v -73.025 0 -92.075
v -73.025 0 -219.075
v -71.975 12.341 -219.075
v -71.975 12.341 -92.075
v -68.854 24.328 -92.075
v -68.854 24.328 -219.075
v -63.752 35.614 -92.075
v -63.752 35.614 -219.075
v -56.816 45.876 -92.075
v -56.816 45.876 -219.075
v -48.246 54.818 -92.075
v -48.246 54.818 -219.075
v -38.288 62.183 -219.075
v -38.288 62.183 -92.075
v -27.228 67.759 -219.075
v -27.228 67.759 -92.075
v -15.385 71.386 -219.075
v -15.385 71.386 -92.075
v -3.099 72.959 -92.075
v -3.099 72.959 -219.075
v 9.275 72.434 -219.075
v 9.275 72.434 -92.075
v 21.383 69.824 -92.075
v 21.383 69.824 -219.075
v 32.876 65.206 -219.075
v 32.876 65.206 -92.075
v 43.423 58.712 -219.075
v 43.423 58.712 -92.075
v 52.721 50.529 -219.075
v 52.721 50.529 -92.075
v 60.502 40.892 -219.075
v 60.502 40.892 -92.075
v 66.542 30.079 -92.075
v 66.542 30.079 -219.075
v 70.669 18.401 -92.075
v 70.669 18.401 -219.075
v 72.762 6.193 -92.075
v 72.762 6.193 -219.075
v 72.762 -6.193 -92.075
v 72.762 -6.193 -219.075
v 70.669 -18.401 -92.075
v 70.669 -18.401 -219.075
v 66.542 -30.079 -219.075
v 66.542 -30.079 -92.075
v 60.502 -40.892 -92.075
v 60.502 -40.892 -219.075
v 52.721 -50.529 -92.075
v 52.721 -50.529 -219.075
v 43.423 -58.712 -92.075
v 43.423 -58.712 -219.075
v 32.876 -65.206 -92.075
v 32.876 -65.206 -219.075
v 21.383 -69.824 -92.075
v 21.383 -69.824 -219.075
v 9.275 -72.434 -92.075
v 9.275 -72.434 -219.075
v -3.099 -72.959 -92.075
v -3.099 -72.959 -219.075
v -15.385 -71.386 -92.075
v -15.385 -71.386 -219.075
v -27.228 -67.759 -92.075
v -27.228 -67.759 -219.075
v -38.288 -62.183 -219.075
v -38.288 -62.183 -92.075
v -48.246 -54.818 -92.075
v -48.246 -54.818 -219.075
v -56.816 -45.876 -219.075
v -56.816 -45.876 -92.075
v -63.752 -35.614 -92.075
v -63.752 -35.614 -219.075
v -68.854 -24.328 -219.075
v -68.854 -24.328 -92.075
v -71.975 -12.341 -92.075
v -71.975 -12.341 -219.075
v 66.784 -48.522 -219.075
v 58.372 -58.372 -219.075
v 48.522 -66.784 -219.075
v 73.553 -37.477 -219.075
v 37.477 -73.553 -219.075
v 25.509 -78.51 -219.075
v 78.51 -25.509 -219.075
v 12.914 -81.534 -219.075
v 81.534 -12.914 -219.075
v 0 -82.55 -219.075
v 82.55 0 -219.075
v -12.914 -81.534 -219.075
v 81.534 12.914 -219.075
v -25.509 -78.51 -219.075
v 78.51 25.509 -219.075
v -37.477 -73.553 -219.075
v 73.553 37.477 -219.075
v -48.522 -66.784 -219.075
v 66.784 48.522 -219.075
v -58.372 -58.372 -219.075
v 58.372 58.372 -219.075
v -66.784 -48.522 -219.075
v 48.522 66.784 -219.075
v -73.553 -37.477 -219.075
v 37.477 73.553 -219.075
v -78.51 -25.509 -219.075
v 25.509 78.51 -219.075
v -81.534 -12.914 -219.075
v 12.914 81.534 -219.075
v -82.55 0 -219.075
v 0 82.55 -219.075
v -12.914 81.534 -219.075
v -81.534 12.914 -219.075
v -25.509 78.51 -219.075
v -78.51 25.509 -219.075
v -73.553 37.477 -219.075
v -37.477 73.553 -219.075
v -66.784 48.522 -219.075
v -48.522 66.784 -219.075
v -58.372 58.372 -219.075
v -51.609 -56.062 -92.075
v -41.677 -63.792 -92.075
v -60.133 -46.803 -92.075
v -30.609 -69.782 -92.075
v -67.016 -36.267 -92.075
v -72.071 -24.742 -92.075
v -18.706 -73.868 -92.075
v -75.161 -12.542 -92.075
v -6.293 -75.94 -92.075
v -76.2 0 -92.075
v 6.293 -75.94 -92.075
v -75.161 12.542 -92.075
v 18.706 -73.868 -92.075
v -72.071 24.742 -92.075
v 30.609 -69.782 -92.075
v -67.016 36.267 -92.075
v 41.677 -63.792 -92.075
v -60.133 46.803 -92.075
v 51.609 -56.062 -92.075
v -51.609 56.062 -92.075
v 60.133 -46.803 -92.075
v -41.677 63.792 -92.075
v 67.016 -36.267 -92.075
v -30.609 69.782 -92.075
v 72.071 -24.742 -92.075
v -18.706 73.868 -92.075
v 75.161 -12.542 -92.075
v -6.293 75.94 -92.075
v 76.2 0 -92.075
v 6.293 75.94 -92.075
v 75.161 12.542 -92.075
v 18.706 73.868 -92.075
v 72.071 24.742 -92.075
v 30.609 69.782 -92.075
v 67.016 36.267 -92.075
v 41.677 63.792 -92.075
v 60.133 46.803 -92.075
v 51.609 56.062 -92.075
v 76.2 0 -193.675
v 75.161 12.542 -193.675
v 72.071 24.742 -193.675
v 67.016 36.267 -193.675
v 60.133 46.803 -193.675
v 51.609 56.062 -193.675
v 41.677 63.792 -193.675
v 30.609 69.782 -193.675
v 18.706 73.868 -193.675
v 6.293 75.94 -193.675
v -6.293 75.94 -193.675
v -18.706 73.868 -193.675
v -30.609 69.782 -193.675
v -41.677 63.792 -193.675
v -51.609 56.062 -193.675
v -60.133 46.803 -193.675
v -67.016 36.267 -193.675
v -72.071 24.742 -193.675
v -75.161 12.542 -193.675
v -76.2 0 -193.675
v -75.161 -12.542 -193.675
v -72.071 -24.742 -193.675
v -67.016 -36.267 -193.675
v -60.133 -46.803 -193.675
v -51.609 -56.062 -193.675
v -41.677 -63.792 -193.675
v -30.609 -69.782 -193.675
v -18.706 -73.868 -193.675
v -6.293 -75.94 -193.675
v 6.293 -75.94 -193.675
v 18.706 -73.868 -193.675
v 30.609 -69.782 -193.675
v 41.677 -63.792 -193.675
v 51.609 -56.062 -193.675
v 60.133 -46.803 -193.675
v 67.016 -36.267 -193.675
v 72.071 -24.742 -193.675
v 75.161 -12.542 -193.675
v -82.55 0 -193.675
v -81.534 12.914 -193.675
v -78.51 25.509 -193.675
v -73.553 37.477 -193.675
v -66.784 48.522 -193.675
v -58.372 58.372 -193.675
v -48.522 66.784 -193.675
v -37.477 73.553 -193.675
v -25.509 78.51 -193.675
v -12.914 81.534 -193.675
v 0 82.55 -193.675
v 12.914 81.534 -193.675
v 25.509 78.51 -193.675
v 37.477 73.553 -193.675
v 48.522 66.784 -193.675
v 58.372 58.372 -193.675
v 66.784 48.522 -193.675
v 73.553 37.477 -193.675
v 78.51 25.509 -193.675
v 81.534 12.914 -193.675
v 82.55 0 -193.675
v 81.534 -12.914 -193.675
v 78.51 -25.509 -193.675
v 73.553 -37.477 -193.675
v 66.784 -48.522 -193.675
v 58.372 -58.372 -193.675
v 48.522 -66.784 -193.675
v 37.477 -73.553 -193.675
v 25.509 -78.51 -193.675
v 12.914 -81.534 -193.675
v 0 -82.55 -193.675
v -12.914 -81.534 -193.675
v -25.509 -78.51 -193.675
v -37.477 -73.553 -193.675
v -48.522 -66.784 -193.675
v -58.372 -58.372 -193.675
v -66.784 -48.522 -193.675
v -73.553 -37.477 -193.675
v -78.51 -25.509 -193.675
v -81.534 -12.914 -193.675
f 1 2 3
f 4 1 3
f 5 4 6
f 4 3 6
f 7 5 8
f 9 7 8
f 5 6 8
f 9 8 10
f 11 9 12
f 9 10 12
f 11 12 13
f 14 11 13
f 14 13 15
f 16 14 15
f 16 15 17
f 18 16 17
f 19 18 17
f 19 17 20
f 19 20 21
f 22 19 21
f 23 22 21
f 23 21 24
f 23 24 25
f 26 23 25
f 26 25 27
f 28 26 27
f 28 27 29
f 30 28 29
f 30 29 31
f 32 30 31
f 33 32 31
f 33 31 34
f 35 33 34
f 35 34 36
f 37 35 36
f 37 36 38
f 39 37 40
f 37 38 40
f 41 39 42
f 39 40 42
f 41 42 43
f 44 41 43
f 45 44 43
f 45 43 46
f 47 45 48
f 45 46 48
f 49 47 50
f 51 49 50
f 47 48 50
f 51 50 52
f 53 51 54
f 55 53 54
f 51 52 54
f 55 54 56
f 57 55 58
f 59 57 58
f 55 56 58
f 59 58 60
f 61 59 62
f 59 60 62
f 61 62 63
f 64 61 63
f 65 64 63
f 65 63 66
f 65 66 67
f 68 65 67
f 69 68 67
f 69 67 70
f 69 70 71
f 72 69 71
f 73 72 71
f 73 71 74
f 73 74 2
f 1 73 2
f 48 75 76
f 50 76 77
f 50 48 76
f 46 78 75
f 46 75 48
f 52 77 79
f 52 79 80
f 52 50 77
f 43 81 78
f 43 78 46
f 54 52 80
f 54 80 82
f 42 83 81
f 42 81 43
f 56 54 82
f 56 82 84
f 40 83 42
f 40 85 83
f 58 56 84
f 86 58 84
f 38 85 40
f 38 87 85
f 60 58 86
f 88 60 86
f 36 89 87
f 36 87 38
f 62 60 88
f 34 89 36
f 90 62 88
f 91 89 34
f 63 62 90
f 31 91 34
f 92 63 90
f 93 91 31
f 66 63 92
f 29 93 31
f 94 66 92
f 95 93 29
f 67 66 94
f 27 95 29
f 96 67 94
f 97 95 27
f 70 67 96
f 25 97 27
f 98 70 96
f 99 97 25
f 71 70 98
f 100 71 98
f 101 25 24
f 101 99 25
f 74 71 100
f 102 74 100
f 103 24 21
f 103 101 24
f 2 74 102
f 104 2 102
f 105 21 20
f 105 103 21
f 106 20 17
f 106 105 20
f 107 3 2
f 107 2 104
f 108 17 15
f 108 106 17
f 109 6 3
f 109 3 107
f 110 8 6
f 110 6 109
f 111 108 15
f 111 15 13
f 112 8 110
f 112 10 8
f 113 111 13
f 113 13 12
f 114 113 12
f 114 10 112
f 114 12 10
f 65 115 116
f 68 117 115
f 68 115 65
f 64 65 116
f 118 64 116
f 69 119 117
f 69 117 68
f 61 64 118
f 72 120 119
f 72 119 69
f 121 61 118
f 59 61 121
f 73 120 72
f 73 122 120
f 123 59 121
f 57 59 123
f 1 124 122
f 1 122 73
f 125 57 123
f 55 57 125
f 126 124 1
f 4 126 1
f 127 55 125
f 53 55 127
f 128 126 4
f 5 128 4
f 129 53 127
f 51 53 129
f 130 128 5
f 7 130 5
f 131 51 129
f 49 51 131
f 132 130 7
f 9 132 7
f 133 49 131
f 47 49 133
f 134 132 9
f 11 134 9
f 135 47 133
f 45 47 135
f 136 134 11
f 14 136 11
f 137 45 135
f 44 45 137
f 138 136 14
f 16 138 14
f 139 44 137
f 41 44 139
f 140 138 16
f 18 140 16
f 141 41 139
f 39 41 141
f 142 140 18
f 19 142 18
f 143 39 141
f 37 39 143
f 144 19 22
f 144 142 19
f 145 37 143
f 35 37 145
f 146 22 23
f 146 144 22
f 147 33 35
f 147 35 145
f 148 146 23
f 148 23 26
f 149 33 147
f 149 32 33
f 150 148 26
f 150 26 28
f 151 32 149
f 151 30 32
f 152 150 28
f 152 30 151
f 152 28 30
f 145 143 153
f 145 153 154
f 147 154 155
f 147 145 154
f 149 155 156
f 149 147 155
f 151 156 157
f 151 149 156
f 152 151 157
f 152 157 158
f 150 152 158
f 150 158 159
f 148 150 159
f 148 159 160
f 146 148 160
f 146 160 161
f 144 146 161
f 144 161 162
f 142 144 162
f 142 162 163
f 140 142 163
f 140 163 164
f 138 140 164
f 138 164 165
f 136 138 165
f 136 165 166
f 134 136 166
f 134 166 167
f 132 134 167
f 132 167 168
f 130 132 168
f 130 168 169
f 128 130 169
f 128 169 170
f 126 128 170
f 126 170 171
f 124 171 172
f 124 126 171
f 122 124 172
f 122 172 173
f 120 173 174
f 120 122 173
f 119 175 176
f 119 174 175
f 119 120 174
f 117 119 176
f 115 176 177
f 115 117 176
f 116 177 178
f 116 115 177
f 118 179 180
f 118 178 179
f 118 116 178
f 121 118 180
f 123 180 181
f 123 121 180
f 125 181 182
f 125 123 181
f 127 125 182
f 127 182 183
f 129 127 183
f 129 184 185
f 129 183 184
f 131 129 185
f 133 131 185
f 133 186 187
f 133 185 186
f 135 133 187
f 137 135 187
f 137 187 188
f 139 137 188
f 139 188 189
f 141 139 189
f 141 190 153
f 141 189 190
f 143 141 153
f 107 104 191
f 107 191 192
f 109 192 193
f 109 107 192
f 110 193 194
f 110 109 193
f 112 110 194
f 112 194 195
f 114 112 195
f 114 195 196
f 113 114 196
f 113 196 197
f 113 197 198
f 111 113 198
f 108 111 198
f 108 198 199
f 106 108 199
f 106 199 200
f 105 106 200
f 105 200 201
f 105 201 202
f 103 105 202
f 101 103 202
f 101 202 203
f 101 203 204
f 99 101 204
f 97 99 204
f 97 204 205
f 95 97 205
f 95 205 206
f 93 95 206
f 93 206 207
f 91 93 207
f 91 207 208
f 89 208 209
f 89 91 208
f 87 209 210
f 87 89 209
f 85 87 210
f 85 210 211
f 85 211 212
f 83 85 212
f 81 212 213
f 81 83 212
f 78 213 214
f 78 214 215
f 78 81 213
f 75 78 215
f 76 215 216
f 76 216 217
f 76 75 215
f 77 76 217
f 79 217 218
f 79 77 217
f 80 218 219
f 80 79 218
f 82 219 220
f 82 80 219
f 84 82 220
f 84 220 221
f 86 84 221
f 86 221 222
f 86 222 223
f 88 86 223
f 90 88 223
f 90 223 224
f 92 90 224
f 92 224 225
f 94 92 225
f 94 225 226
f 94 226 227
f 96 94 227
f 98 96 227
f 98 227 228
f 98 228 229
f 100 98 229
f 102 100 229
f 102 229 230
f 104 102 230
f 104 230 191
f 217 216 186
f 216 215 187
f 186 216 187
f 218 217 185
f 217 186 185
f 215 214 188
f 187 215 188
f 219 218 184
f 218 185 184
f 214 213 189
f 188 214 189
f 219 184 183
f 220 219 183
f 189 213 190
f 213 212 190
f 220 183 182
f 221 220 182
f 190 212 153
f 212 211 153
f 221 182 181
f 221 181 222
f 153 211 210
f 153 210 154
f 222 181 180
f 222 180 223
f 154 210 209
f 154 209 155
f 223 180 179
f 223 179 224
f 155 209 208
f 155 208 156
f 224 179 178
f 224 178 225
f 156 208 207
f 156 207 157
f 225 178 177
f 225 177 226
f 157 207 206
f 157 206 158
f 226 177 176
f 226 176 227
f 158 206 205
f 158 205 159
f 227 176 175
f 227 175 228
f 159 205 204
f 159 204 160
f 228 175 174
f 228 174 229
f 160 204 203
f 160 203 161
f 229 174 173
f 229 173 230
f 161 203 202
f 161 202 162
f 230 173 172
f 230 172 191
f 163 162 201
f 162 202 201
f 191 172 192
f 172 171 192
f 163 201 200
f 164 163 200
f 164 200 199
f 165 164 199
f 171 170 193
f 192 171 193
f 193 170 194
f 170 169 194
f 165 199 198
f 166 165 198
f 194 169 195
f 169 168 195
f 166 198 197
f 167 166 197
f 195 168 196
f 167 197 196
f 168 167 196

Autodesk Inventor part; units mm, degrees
ref_plane "YZ Plane" through (0, 0, 0) normal (1, 0, 0) x (0, 1, 0)
ref_plane "XZ Plane" through (0, 0, 0) normal (0, 1, 0) x (-1, 0, 0)
ref_plane "XY Plane" through (0, 0, 0) normal (0, 0, 1) x (1, 0, 0)
sketch "Sketch1" plane through (0, 0, 0) normal (0, 0, 1) x (1, 0, 0)
  circle A0 centre (0, 0) radius 76.2
  dimension "tubeDiameter" = 152.4
extrude "Extrusion1" add sketch "Sketch1" along normal mid plane 438.15
sketch "Sketch2" plane through (0, 0, -219.075) normal (0, 0, -1) x (-1, 0, 0)
  circle A0 centre (0, 0) radius 73.025
  dimension "d6" = 146.05
extrude "Extrusion2" cut sketch "Sketch2" against normal blind 406.4
sketch "Sketch3" plane through (0, 0, 219.075) normal (0, 0, 1) x (1, 0, 0)
  circle A0 centre (0, 0) radius 82.55
  circle A1 centre (0, 0) radius 76.2
  dimension "d9" = 165.1
extrude "Extrusion3" add sketch "Sketch3" against normal blind 25.4
sketch "Sketch4" plane through (0, 0, -219.075) normal (0, 0, -1) x (-1, 0, 0)
  circle A0 centre (0, 0) radius 76.2
  circle A1 centre (0, 0) radius 82.55
extrude "Extrusion4" add sketch "Sketch4" against normal blind 25.4
sketch "Sketch7" plane through (0, 0, 219.075) normal (0, 0, 1) x (1, 0, 0)
  circle A0 centre (0, 0) radius 82.55 projected
  circle A1 centre (0, 0) radius 82.55
extrude "Extrusion6" cut sketch "Sketch7" against normal blind 311.15
properties part number "trussTelescopeTubeFront" material "Aluminum 6061"
